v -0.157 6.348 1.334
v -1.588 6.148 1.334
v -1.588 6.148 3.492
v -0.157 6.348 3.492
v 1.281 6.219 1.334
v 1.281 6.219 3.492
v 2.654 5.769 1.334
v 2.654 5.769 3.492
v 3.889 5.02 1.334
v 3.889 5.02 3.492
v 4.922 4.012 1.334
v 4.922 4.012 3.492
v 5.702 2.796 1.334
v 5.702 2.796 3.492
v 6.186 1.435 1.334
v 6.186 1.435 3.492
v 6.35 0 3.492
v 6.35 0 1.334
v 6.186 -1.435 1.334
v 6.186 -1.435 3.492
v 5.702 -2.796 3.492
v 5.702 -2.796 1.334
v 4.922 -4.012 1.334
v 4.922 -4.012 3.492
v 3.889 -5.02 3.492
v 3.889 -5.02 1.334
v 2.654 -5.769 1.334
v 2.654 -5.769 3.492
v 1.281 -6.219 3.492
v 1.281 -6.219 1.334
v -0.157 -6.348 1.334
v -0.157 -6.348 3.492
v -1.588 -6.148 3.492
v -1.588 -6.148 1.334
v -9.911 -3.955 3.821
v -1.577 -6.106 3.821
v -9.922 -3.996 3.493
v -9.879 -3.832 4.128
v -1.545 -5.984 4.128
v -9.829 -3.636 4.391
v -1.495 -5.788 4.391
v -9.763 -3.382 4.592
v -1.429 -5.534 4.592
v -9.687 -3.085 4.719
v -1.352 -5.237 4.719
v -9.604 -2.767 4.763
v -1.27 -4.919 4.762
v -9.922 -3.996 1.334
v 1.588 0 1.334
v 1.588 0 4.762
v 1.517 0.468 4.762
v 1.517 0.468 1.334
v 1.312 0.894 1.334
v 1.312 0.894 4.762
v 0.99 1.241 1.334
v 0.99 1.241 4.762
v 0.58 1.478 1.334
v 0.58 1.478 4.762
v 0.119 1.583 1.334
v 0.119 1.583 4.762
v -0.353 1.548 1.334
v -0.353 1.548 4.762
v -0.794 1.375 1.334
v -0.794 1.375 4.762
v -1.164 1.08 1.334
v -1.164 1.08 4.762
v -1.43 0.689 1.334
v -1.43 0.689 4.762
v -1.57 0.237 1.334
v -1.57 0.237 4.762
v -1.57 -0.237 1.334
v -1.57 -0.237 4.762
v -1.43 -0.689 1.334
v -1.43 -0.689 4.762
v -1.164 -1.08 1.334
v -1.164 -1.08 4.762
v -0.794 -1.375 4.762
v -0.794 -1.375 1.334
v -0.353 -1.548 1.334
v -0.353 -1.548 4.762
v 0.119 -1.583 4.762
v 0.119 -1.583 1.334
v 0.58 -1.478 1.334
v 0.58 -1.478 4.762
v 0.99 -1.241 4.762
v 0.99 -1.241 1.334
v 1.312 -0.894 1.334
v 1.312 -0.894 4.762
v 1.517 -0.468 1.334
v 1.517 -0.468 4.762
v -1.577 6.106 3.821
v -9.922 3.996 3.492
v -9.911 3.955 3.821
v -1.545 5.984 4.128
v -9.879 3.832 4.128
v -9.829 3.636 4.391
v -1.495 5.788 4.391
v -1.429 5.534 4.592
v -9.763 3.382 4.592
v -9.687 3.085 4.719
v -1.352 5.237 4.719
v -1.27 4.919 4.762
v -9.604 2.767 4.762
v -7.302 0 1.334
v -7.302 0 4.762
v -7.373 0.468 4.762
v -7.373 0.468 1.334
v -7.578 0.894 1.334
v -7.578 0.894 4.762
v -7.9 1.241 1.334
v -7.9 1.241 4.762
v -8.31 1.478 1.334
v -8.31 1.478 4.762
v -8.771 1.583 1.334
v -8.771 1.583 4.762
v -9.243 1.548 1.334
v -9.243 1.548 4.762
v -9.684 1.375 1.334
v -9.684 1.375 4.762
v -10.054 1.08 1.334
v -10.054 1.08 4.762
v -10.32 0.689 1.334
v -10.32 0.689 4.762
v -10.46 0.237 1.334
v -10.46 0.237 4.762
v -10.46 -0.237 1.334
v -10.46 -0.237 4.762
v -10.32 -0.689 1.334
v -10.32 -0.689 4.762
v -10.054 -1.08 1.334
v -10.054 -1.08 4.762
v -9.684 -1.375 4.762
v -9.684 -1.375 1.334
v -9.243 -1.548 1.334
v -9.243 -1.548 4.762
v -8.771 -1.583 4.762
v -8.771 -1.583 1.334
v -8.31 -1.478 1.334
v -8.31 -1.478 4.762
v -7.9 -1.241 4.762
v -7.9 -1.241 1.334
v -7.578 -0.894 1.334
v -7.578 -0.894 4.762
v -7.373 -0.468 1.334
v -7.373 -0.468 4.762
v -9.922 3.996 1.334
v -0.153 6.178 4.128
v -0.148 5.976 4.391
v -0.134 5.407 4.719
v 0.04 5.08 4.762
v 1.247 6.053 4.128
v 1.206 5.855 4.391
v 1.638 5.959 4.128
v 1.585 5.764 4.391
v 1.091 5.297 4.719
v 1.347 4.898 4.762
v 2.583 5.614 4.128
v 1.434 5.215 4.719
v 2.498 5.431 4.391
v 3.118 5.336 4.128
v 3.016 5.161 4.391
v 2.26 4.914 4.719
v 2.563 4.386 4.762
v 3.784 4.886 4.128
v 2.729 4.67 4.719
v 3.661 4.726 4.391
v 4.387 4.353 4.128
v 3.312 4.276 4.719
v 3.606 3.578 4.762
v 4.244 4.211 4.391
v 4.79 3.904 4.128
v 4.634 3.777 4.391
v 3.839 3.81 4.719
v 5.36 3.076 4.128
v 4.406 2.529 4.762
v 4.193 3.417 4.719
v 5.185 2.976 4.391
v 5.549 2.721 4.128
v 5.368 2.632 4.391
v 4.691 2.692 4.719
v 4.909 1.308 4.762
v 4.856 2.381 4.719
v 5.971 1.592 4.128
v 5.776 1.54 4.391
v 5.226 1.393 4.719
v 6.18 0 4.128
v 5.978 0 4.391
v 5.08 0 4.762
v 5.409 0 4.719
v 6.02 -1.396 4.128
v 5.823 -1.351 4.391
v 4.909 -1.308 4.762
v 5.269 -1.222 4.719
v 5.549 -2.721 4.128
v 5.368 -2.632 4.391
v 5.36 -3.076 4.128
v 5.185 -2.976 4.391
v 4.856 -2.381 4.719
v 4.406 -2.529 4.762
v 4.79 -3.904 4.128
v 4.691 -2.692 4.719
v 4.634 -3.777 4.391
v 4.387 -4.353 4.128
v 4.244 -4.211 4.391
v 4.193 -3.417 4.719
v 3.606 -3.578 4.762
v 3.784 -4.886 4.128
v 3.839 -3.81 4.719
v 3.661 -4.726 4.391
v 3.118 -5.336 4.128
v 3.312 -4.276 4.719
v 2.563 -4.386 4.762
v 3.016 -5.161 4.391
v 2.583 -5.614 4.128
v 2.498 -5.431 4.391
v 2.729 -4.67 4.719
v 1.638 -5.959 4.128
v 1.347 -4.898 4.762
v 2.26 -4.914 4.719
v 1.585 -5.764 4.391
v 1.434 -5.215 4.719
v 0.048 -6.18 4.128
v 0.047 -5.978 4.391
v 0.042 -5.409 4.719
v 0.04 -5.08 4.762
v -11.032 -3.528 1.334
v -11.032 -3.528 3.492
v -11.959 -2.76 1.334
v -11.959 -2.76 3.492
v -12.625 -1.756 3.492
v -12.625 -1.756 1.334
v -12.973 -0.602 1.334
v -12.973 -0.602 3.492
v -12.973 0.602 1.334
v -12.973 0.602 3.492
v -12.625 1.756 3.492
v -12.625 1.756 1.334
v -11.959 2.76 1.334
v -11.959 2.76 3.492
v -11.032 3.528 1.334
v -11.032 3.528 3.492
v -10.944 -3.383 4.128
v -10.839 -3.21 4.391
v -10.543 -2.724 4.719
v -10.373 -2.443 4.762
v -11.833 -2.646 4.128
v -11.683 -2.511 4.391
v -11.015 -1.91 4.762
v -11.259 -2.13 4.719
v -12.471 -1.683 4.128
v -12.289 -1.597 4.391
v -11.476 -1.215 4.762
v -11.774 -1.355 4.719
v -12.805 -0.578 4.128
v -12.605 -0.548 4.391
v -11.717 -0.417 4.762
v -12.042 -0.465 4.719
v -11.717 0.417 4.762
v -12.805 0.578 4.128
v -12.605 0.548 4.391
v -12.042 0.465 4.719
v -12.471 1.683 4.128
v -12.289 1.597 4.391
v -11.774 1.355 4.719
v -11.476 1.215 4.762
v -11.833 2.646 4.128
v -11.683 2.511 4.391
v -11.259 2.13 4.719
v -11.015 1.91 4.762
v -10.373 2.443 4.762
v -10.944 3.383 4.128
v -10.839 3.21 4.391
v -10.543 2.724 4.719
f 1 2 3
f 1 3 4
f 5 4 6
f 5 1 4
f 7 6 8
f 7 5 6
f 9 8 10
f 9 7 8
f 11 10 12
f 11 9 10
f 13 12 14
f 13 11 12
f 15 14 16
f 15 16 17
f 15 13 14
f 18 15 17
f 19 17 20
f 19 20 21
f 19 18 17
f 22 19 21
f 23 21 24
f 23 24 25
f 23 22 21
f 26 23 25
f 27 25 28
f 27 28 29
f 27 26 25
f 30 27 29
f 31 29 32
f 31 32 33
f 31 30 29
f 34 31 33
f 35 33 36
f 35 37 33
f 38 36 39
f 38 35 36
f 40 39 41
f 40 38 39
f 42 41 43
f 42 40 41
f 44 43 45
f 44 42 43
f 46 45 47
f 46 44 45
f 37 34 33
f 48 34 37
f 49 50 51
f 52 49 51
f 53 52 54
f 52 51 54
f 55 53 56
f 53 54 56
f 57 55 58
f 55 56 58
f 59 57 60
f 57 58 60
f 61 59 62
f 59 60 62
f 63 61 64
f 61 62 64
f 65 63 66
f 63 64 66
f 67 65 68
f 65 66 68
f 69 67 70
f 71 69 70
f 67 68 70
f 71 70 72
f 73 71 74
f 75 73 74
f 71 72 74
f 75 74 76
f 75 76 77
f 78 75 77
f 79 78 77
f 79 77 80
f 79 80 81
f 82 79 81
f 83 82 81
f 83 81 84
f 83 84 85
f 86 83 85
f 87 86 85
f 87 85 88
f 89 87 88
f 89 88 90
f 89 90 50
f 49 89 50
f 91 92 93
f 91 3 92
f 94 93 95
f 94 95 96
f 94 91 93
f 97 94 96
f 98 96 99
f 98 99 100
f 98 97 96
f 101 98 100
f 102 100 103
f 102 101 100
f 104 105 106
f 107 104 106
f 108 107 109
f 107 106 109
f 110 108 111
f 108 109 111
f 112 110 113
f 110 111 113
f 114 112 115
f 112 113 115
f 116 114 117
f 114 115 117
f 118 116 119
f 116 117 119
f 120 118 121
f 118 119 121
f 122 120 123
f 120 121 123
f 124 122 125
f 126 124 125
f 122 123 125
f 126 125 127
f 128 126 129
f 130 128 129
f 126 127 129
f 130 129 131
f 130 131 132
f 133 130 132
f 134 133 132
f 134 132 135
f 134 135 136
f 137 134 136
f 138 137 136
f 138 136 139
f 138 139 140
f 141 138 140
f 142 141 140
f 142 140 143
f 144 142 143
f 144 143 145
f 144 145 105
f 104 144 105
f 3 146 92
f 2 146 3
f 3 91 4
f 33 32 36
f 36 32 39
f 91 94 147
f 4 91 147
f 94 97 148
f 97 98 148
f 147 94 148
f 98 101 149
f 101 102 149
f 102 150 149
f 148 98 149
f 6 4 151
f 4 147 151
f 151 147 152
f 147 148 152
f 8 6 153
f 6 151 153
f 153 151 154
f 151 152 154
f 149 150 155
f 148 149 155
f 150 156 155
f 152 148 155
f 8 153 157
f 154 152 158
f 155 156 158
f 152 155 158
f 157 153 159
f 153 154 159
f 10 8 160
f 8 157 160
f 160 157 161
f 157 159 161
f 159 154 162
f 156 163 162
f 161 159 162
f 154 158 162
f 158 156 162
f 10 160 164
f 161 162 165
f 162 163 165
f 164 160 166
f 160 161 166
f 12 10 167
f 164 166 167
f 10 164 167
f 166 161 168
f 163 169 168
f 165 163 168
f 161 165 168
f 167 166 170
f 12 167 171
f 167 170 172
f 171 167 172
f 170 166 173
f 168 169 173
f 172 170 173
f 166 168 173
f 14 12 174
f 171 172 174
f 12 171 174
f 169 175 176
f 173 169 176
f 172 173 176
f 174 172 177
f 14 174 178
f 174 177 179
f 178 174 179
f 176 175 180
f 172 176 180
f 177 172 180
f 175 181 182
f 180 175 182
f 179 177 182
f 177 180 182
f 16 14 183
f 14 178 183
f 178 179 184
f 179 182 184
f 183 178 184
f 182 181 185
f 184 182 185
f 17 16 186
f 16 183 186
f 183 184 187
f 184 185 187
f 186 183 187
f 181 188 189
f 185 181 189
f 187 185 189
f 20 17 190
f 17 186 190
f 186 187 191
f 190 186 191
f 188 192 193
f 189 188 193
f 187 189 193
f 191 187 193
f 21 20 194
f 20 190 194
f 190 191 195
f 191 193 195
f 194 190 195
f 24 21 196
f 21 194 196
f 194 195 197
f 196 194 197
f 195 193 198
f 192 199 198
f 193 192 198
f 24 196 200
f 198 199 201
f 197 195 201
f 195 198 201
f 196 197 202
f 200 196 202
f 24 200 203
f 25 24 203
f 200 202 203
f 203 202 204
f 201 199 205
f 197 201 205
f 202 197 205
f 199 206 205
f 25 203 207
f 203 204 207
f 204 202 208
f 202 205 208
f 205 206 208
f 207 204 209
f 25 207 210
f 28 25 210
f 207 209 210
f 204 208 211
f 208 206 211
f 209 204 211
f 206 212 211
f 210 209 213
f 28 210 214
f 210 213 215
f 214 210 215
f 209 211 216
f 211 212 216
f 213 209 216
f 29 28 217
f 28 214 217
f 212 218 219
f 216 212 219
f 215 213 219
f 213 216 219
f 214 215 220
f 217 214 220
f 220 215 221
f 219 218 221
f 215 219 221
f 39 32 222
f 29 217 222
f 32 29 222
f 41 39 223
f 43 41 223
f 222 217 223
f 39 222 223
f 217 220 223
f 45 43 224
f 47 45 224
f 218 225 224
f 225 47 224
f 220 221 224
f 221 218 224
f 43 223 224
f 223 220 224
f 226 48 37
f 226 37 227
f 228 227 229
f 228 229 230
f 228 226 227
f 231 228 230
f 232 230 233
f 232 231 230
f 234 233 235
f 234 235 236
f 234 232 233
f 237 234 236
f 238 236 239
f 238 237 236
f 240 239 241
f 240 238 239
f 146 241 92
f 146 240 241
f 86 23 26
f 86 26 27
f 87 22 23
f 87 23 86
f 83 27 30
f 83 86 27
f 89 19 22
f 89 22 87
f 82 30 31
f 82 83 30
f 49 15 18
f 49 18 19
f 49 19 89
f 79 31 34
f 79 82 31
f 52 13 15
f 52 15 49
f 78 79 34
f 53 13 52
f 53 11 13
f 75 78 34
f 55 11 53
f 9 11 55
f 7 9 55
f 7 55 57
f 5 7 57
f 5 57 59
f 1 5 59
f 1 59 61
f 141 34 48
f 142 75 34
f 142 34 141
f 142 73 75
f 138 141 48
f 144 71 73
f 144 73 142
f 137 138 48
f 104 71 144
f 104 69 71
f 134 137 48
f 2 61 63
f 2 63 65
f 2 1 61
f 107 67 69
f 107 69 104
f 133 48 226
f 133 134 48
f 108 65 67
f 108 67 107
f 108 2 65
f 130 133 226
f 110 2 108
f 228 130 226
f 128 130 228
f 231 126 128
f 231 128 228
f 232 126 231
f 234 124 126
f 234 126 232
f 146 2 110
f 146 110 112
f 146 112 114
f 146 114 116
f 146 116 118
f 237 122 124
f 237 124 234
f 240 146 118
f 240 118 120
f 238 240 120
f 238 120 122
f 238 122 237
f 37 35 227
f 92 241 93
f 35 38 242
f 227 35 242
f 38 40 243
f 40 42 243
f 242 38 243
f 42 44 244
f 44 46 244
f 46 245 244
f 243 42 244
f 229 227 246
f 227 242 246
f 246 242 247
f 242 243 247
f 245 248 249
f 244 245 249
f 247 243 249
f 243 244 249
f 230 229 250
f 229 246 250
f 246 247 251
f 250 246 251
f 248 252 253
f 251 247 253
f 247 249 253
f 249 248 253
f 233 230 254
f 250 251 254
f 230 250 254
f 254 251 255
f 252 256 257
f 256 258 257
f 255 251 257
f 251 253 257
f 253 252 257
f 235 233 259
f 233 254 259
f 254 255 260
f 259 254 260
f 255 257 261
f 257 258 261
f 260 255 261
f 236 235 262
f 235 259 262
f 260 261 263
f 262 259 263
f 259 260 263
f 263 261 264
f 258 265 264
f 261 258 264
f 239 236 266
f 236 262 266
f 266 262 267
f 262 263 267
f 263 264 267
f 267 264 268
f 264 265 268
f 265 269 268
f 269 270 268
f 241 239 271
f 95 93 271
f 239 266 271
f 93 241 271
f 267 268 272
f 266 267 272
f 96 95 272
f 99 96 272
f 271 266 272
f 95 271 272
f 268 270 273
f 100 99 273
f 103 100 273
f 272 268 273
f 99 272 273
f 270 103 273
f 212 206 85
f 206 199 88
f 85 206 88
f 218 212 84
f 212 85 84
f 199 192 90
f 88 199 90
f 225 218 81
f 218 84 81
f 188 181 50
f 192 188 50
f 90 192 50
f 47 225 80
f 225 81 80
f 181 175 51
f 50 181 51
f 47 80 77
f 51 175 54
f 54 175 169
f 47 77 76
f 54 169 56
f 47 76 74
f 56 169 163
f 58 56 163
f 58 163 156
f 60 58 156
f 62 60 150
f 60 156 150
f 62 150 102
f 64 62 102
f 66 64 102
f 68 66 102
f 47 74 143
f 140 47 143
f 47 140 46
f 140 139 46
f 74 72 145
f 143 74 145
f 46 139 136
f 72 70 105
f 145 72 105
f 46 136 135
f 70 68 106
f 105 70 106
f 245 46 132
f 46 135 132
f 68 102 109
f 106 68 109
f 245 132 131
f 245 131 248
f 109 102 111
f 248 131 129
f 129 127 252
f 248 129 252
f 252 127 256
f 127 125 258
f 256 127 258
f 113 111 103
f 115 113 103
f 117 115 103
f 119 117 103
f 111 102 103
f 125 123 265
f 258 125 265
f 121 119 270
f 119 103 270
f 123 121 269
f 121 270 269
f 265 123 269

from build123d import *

# Parameters (mm, degrees)
BOSS_EXTRUDE1_DEPTH        = 4.7625
CUT_EXTRUDE1_DEPTH         = 1.3335
F_1_8_0_1250_DOWEL_HOLE1_D = 3.175
FILLET1_R                  = 1.27


with BuildPart() as part:
    # Sketch1 → Boss-Extrude1 (new body)
    with BuildSketch(Plane.XY):
        with BuildLine():
            Line((-9.921875, 3.99643469), (-1.5875, 6.148361062))
            ThreePointArc((-1.5875, 6.148361062), (6.35, 0), (-1.5875, -6.148361062))
            Line((-1.5875, -6.148361062), (-9.921875, -3.99643469))
            ThreePointArc((-9.921875, -3.99643469), (-13.0175, 0), (-9.921875, 3.99643469))
        make_face()
    extrude(amount=BOSS_EXTRUDE1_DEPTH)

    # Sketch2 → Cut-Extrude1 (cut)
    with BuildSketch(Plane(origin=(0, 0, 0), x_dir=(-1, 0, 0), z_dir=(0, 0, -1))):
        with BuildLine():
            Line((9.921875, 3.99643469), (1.5875, 6.148361062))
            ThreePointArc((1.5875, 6.148361062), (-6.35, 0), (1.5875, -6.148361062))
            Line((1.5875, -6.148361062), (9.921875, -3.99643469))
            ThreePointArc((9.921875, -3.99643469), (13.0175, 0), (9.921875, 3.99643469))
        make_face()
    extrude(amount=-CUT_EXTRUDE1_DEPTH, mode=Mode.SUBTRACT)

    # 1/8 (0.1250) Dowel Hole1 (through all)
    with Locations(Plane(origin=(0, 0, 1.3335), x_dir=(-1, 0, 0), z_dir=(0, 0, -1))):
        with Locations((8.89, 0), (0, 0)):
            Hole(F_1_8_0_1250_DOWEL_HOLE1_D / 2)

    # Fillet1
    fillet1_edges = [part.edges().sort_by_distance(p)[0] for p in [
        (6.35, 0, 4.7625),
        (-5.7546875, 5.072397876, 4.7625),
        (-13.0175, 0, 4.7625),
        (-5.7546875, -5.072397876, 4.7625),
    ]]
    fillet(fillet1_edges, radius=FILLET1_R)


solid = part.part
